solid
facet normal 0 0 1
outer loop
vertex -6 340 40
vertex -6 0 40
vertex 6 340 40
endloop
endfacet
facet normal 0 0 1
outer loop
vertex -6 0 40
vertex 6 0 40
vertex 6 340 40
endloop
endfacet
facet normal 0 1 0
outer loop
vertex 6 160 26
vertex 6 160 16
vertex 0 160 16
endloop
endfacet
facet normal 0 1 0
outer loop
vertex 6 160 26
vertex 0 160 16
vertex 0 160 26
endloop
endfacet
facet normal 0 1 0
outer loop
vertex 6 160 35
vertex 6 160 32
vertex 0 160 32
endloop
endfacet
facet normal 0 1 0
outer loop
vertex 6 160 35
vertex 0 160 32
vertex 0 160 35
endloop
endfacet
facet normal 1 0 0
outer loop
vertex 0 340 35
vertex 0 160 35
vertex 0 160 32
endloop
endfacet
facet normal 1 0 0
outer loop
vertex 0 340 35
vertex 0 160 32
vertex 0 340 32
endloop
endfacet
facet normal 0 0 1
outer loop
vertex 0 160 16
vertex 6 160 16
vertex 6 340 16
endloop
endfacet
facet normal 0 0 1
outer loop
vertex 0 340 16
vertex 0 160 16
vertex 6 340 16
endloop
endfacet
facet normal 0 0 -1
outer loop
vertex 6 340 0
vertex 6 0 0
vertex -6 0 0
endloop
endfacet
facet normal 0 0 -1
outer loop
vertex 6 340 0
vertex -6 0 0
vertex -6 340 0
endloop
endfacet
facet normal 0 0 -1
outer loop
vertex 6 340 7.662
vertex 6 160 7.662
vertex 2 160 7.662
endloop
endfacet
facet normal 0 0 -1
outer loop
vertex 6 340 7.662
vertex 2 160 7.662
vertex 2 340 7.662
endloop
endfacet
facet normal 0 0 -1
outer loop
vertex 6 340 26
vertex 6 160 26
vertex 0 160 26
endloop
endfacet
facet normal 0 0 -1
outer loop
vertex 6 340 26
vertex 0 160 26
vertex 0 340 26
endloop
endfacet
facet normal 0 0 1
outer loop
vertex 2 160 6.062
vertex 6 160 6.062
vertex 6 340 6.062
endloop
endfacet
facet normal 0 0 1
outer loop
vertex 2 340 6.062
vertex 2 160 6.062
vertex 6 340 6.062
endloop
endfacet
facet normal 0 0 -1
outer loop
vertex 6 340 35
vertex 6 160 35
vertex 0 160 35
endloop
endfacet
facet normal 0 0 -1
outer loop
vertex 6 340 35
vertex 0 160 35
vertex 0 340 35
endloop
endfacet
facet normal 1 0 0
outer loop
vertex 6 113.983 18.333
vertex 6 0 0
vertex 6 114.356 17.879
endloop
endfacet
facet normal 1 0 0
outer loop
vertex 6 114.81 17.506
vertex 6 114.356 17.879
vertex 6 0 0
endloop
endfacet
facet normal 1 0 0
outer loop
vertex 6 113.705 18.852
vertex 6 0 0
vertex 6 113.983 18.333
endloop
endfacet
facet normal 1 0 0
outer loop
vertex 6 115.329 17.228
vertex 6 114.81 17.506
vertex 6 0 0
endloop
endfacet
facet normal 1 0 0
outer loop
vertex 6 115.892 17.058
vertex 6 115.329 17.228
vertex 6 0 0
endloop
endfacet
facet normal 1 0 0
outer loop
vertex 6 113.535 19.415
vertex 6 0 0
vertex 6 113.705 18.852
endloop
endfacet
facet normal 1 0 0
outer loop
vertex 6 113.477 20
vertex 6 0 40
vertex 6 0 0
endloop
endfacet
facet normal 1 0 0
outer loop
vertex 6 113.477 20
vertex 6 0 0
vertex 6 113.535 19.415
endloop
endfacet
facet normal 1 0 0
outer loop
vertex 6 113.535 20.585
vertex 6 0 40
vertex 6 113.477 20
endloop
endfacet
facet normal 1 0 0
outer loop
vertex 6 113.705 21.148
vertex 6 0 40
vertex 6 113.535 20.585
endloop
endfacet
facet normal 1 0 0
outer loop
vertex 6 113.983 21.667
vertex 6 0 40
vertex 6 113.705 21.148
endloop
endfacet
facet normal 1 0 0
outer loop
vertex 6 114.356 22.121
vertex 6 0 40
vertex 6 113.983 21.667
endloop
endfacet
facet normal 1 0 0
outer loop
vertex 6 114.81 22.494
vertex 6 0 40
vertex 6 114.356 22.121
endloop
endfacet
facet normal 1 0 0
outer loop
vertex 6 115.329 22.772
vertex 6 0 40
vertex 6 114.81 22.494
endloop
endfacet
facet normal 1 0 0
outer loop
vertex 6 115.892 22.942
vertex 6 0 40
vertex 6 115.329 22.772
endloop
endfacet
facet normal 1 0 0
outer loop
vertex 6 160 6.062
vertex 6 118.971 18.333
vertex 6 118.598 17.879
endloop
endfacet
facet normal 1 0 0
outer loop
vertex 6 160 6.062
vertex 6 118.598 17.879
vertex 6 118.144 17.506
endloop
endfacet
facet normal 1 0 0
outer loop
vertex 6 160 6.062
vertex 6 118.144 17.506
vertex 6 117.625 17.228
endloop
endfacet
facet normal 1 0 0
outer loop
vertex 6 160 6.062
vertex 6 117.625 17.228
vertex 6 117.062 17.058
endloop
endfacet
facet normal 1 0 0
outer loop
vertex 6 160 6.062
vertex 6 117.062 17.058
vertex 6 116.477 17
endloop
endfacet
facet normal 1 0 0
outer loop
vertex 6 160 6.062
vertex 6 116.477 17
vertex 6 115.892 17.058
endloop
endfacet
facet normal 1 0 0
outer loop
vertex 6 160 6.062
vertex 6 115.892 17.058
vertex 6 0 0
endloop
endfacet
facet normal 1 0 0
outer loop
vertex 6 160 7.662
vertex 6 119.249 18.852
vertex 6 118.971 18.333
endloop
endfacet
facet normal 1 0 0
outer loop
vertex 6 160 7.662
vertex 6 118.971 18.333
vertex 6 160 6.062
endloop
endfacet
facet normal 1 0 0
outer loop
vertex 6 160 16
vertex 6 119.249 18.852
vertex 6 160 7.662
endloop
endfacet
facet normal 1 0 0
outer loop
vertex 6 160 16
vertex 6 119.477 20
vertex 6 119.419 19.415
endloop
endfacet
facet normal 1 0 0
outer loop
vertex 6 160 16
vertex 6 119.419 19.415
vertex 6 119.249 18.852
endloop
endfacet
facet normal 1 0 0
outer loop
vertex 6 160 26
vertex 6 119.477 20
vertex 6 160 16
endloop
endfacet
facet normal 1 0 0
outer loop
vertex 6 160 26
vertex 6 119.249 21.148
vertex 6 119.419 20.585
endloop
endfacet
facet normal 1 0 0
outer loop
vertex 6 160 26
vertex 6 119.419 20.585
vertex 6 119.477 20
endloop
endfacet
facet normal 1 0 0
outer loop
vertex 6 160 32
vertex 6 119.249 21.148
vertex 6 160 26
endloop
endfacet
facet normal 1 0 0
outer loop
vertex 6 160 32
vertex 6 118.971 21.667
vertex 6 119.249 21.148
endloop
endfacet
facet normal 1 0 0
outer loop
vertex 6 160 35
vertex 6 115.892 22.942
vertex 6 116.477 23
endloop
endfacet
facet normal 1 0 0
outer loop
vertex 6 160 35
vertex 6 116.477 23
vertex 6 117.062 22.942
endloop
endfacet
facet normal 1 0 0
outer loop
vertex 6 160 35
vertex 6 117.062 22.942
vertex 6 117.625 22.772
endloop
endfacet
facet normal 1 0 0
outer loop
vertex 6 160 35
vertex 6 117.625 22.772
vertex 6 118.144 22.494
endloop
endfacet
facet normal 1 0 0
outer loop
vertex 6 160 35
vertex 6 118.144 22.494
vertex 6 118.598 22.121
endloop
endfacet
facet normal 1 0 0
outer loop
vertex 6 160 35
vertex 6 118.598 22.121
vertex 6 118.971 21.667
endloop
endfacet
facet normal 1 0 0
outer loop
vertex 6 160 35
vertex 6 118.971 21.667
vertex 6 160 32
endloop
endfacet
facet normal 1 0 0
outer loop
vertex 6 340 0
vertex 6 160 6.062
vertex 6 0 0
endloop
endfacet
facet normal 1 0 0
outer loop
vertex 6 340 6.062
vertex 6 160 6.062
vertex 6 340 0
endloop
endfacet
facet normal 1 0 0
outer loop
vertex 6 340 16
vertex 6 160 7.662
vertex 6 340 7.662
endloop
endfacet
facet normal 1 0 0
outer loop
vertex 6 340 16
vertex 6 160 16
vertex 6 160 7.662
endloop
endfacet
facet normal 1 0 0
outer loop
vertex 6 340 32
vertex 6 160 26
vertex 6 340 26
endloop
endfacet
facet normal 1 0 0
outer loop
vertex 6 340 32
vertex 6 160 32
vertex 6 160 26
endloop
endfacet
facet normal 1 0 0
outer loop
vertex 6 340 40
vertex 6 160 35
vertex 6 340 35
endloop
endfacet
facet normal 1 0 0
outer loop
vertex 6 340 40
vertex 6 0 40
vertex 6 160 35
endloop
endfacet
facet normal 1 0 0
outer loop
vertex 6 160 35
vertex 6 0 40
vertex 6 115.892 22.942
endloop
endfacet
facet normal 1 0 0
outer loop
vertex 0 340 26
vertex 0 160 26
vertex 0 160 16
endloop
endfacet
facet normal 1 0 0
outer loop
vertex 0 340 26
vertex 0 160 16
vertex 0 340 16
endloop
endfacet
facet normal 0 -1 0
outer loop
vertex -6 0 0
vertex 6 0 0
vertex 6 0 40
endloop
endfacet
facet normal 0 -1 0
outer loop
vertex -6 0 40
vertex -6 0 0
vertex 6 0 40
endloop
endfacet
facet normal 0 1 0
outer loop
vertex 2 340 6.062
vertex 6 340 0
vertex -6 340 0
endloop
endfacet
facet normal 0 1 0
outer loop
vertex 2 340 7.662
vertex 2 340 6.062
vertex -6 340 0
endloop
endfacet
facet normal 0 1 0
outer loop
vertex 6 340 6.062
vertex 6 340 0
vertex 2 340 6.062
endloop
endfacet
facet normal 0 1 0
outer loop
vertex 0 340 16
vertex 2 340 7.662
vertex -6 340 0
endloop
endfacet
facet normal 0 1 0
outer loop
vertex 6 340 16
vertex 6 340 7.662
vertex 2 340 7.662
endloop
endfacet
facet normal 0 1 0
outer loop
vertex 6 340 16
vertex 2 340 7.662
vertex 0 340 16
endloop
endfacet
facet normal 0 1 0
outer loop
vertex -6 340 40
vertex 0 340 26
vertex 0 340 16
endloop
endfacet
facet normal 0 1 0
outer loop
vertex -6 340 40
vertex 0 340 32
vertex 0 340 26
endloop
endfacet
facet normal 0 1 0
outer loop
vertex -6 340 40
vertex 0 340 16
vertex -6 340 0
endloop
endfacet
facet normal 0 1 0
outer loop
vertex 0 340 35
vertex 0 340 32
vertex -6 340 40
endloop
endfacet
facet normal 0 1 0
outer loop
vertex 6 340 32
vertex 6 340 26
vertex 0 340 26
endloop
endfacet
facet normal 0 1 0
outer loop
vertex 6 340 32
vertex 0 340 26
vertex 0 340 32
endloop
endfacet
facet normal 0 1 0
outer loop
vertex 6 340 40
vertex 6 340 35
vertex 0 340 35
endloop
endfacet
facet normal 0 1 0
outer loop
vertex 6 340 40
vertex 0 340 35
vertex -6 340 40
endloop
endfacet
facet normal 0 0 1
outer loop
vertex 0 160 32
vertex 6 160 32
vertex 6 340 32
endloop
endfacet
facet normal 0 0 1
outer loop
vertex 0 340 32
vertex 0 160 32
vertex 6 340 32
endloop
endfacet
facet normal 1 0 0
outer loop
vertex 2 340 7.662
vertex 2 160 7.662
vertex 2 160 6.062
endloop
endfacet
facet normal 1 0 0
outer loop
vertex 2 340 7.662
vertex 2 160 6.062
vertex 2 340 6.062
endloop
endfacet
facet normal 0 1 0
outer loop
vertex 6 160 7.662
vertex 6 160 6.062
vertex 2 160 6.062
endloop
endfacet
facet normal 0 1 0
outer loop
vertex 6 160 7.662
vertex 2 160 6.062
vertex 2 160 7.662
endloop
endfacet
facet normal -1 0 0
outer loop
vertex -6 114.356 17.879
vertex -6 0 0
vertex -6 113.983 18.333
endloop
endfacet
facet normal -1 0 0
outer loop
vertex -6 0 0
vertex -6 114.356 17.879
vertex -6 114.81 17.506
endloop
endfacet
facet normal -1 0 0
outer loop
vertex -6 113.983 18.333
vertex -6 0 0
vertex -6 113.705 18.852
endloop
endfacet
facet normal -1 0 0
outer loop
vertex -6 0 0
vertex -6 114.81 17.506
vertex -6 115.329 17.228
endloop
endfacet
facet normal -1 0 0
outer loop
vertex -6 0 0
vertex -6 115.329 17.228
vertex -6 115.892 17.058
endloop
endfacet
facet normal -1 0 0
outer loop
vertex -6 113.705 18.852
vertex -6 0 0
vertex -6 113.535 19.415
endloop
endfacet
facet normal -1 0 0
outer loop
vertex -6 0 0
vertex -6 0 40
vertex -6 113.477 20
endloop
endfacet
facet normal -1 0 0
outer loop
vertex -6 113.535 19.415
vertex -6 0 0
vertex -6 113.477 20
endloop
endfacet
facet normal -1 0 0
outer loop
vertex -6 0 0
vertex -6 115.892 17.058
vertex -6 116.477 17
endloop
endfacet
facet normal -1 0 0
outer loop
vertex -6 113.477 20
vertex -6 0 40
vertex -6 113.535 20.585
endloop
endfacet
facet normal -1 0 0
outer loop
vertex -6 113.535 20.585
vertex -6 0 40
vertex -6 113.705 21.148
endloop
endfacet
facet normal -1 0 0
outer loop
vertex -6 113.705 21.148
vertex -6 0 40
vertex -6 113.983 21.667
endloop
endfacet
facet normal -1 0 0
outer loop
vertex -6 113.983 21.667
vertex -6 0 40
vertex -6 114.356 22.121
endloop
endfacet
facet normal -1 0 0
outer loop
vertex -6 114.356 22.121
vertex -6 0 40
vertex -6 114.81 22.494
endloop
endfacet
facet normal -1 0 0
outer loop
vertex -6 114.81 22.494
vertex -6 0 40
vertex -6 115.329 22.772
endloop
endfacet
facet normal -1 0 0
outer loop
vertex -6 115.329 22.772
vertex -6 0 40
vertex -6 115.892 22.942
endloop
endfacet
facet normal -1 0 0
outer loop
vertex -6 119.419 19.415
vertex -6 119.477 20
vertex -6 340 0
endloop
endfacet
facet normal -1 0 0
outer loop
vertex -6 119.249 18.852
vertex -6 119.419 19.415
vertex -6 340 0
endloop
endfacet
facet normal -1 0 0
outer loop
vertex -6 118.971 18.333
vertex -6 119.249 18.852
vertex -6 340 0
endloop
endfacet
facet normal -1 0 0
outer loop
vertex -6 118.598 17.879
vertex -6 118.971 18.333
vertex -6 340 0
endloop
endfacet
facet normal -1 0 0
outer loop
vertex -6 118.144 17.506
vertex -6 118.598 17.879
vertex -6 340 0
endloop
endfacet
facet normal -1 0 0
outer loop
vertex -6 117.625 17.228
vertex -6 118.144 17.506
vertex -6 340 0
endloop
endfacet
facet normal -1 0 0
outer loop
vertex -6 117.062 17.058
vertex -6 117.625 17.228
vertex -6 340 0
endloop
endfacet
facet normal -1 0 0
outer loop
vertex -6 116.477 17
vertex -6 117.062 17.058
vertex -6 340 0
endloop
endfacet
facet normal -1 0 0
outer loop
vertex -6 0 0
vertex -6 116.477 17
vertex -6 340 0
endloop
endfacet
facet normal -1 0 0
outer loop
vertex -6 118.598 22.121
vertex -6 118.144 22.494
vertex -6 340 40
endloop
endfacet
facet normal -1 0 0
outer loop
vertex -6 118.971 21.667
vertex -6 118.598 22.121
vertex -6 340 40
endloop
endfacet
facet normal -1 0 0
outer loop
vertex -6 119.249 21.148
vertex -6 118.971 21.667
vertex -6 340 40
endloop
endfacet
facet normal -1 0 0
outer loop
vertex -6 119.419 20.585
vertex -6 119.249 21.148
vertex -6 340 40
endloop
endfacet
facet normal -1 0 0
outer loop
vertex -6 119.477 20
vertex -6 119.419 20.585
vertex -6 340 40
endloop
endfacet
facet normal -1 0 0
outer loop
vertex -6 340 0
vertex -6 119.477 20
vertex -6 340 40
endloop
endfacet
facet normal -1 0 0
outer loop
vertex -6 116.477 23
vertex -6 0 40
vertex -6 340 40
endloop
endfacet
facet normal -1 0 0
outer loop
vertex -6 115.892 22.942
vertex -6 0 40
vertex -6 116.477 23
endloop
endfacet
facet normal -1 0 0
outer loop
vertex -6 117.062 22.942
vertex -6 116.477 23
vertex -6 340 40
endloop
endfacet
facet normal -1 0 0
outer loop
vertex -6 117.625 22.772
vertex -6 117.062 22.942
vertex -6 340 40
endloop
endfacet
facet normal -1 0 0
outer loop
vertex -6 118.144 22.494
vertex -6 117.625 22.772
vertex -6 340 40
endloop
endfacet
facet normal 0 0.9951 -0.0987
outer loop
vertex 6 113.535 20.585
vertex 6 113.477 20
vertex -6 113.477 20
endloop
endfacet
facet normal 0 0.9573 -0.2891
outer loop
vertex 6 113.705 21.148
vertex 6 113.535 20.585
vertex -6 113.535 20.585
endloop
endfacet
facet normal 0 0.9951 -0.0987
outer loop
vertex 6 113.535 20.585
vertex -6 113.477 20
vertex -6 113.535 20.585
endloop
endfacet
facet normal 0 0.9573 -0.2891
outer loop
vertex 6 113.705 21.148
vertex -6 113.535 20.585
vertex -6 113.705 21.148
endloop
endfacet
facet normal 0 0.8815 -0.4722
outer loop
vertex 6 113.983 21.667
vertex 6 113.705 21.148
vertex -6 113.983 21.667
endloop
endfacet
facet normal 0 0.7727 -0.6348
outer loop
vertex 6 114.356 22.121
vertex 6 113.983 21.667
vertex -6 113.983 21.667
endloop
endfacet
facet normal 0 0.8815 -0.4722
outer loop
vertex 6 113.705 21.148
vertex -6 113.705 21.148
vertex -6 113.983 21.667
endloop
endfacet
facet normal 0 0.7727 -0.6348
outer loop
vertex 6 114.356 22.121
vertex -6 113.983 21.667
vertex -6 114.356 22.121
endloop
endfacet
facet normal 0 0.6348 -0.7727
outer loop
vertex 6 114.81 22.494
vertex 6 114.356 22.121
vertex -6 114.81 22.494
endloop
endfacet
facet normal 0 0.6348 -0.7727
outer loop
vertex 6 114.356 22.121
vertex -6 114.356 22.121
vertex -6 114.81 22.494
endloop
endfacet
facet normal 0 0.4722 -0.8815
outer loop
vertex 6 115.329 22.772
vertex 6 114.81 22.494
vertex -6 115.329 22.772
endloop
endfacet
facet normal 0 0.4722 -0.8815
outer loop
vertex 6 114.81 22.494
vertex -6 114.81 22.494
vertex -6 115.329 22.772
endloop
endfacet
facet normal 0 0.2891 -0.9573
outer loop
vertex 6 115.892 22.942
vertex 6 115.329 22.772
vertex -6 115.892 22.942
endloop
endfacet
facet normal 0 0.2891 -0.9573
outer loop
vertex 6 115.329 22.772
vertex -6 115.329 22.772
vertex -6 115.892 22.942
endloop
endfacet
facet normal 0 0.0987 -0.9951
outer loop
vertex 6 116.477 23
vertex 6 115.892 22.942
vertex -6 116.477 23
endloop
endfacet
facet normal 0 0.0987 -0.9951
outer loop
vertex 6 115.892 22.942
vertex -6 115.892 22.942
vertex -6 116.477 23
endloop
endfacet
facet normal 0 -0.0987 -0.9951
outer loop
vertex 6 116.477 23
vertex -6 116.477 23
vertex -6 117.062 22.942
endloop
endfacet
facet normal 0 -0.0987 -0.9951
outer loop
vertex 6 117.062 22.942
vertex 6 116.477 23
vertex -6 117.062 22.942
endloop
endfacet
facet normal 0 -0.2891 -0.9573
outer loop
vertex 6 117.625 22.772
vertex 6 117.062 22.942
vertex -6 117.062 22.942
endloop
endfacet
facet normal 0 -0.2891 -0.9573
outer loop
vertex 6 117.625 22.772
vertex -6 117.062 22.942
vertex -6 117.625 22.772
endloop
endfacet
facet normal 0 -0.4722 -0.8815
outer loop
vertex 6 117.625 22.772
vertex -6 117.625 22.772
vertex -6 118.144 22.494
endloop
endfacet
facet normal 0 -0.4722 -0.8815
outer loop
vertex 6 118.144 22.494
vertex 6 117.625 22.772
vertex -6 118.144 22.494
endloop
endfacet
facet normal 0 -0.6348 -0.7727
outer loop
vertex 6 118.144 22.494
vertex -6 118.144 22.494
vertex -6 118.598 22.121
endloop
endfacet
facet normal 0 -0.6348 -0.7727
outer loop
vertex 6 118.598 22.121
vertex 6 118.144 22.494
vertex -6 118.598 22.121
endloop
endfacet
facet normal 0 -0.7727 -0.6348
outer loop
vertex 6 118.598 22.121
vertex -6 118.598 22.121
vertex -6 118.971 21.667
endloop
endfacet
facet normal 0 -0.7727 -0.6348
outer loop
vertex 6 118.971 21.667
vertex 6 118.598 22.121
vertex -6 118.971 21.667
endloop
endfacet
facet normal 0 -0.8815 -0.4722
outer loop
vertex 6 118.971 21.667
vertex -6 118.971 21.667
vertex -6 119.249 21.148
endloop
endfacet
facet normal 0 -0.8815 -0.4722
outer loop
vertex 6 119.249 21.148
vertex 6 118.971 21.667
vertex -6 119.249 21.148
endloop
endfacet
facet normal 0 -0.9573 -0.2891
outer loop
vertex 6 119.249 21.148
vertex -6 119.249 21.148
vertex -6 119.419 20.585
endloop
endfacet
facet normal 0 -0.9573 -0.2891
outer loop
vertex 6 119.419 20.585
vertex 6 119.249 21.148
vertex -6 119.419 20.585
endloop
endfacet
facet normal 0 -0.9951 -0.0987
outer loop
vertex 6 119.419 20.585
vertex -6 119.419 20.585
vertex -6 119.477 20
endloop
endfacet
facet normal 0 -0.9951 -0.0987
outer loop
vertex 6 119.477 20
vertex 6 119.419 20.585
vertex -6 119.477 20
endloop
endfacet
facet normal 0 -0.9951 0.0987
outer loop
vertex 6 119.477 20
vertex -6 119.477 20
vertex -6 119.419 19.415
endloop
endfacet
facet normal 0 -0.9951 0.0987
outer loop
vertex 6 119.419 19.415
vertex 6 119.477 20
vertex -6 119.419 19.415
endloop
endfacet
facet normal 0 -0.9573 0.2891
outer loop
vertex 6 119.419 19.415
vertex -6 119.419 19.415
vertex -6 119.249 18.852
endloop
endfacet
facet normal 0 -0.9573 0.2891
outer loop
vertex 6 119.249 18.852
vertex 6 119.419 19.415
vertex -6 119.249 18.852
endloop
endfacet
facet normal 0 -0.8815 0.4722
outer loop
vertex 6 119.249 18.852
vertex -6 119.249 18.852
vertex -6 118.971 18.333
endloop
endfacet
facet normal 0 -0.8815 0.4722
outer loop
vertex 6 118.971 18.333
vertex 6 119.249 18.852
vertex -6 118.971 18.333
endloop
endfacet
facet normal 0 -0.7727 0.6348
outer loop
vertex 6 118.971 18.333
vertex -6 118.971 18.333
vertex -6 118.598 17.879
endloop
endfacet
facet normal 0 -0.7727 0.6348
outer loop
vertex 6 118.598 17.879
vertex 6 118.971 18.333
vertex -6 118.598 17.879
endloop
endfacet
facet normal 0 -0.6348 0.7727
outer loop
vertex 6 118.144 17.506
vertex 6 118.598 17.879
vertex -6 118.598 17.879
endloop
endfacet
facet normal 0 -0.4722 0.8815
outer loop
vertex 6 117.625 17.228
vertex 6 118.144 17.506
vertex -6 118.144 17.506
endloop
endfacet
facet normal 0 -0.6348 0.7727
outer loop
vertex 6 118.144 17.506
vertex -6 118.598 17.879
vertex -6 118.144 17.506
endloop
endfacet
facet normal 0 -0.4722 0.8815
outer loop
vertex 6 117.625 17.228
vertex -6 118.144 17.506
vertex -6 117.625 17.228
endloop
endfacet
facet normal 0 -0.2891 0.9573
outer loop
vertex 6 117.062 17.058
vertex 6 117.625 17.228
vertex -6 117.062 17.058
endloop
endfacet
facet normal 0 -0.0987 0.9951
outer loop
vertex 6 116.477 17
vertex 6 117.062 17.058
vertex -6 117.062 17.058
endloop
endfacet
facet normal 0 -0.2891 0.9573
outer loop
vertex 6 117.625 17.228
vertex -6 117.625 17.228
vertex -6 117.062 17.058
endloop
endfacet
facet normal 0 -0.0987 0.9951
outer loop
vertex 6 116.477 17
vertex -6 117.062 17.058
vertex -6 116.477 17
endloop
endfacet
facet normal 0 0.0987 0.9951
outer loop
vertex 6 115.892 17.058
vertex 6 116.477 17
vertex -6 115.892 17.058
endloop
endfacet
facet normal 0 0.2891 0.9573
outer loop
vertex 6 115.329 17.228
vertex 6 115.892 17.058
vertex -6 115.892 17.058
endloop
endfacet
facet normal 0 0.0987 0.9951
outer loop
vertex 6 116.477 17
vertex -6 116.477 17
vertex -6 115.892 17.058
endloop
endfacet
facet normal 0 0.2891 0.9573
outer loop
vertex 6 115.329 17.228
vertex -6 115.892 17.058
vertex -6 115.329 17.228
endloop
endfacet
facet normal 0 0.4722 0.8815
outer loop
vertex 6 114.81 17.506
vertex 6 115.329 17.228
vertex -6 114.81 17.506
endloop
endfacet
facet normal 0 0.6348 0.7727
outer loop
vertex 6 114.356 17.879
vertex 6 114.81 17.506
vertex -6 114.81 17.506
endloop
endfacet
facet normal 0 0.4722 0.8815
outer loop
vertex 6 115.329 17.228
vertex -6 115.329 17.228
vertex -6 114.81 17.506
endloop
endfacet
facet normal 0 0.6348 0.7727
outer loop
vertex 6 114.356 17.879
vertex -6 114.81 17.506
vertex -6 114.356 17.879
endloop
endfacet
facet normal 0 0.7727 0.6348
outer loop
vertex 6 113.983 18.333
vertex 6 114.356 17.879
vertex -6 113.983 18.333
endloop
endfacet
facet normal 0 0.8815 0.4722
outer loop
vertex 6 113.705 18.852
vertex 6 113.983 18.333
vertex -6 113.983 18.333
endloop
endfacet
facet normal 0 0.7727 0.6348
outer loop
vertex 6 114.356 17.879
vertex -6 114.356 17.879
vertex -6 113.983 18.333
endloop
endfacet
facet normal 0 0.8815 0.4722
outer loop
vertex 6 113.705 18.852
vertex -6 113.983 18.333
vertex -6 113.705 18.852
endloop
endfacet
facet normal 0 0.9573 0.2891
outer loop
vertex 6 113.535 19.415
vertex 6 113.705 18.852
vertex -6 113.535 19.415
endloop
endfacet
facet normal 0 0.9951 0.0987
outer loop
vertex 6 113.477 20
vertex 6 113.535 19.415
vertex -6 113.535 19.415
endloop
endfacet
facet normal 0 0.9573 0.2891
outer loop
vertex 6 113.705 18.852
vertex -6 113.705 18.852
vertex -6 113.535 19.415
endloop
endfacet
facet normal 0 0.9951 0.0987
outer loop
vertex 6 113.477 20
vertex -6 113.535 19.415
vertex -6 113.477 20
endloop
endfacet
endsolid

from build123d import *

# Parameters (mm, degrees)
F0_W     = 340
F0_H     = 40
F1_DEPTH = 6
F2_W     = 180
F2_H     = 3
F3_DEPTH = 6
F5_D     = 6
F6_W     = 180
F6_H     = 10
F7_DEPTH = 6
F8_W     = 180
F8_H     = 1.6
F9_DEPTH = 4


with BuildPart() as f1:
    # F0 (on Right) → F1 (new body, symmetric)
    with BuildSketch(Plane.YZ):
        with Locations((170, 20)):
            Rectangle(F0_W, F0_H)
    extrude(amount=F1_DEPTH, both=True)

    # F2 (on face) → F3 (cut)
    with BuildSketch(Plane.YZ.offset(6)):
        with Locations((250, 33.5)):
            Rectangle(F2_W, F2_H)
    extrude(amount=-F3_DEPTH, mode=Mode.SUBTRACT)

    # F5 (through all)
    with Locations(Plane.YZ.offset(6)):
        with Locations((116.477057, 20)):
            Hole(F5_D / 2)

    # F6 (on face) → F7 (cut)
    with BuildSketch(Plane.YZ.offset(6)):
        with Locations((250, 21)):
            Rectangle(F6_W, F6_H)
    extrude(amount=-F7_DEPTH, mode=Mode.SUBTRACT)

    # F8 (on face) → F9 (cut)
    with BuildSketch(Plane.YZ.offset(6)):
        with Locations((250, 6.862387)):
            Rectangle(F8_W, F8_H)
    extrude(amount=-F9_DEPTH, mode=Mode.SUBTRACT)


solid = f1.part
